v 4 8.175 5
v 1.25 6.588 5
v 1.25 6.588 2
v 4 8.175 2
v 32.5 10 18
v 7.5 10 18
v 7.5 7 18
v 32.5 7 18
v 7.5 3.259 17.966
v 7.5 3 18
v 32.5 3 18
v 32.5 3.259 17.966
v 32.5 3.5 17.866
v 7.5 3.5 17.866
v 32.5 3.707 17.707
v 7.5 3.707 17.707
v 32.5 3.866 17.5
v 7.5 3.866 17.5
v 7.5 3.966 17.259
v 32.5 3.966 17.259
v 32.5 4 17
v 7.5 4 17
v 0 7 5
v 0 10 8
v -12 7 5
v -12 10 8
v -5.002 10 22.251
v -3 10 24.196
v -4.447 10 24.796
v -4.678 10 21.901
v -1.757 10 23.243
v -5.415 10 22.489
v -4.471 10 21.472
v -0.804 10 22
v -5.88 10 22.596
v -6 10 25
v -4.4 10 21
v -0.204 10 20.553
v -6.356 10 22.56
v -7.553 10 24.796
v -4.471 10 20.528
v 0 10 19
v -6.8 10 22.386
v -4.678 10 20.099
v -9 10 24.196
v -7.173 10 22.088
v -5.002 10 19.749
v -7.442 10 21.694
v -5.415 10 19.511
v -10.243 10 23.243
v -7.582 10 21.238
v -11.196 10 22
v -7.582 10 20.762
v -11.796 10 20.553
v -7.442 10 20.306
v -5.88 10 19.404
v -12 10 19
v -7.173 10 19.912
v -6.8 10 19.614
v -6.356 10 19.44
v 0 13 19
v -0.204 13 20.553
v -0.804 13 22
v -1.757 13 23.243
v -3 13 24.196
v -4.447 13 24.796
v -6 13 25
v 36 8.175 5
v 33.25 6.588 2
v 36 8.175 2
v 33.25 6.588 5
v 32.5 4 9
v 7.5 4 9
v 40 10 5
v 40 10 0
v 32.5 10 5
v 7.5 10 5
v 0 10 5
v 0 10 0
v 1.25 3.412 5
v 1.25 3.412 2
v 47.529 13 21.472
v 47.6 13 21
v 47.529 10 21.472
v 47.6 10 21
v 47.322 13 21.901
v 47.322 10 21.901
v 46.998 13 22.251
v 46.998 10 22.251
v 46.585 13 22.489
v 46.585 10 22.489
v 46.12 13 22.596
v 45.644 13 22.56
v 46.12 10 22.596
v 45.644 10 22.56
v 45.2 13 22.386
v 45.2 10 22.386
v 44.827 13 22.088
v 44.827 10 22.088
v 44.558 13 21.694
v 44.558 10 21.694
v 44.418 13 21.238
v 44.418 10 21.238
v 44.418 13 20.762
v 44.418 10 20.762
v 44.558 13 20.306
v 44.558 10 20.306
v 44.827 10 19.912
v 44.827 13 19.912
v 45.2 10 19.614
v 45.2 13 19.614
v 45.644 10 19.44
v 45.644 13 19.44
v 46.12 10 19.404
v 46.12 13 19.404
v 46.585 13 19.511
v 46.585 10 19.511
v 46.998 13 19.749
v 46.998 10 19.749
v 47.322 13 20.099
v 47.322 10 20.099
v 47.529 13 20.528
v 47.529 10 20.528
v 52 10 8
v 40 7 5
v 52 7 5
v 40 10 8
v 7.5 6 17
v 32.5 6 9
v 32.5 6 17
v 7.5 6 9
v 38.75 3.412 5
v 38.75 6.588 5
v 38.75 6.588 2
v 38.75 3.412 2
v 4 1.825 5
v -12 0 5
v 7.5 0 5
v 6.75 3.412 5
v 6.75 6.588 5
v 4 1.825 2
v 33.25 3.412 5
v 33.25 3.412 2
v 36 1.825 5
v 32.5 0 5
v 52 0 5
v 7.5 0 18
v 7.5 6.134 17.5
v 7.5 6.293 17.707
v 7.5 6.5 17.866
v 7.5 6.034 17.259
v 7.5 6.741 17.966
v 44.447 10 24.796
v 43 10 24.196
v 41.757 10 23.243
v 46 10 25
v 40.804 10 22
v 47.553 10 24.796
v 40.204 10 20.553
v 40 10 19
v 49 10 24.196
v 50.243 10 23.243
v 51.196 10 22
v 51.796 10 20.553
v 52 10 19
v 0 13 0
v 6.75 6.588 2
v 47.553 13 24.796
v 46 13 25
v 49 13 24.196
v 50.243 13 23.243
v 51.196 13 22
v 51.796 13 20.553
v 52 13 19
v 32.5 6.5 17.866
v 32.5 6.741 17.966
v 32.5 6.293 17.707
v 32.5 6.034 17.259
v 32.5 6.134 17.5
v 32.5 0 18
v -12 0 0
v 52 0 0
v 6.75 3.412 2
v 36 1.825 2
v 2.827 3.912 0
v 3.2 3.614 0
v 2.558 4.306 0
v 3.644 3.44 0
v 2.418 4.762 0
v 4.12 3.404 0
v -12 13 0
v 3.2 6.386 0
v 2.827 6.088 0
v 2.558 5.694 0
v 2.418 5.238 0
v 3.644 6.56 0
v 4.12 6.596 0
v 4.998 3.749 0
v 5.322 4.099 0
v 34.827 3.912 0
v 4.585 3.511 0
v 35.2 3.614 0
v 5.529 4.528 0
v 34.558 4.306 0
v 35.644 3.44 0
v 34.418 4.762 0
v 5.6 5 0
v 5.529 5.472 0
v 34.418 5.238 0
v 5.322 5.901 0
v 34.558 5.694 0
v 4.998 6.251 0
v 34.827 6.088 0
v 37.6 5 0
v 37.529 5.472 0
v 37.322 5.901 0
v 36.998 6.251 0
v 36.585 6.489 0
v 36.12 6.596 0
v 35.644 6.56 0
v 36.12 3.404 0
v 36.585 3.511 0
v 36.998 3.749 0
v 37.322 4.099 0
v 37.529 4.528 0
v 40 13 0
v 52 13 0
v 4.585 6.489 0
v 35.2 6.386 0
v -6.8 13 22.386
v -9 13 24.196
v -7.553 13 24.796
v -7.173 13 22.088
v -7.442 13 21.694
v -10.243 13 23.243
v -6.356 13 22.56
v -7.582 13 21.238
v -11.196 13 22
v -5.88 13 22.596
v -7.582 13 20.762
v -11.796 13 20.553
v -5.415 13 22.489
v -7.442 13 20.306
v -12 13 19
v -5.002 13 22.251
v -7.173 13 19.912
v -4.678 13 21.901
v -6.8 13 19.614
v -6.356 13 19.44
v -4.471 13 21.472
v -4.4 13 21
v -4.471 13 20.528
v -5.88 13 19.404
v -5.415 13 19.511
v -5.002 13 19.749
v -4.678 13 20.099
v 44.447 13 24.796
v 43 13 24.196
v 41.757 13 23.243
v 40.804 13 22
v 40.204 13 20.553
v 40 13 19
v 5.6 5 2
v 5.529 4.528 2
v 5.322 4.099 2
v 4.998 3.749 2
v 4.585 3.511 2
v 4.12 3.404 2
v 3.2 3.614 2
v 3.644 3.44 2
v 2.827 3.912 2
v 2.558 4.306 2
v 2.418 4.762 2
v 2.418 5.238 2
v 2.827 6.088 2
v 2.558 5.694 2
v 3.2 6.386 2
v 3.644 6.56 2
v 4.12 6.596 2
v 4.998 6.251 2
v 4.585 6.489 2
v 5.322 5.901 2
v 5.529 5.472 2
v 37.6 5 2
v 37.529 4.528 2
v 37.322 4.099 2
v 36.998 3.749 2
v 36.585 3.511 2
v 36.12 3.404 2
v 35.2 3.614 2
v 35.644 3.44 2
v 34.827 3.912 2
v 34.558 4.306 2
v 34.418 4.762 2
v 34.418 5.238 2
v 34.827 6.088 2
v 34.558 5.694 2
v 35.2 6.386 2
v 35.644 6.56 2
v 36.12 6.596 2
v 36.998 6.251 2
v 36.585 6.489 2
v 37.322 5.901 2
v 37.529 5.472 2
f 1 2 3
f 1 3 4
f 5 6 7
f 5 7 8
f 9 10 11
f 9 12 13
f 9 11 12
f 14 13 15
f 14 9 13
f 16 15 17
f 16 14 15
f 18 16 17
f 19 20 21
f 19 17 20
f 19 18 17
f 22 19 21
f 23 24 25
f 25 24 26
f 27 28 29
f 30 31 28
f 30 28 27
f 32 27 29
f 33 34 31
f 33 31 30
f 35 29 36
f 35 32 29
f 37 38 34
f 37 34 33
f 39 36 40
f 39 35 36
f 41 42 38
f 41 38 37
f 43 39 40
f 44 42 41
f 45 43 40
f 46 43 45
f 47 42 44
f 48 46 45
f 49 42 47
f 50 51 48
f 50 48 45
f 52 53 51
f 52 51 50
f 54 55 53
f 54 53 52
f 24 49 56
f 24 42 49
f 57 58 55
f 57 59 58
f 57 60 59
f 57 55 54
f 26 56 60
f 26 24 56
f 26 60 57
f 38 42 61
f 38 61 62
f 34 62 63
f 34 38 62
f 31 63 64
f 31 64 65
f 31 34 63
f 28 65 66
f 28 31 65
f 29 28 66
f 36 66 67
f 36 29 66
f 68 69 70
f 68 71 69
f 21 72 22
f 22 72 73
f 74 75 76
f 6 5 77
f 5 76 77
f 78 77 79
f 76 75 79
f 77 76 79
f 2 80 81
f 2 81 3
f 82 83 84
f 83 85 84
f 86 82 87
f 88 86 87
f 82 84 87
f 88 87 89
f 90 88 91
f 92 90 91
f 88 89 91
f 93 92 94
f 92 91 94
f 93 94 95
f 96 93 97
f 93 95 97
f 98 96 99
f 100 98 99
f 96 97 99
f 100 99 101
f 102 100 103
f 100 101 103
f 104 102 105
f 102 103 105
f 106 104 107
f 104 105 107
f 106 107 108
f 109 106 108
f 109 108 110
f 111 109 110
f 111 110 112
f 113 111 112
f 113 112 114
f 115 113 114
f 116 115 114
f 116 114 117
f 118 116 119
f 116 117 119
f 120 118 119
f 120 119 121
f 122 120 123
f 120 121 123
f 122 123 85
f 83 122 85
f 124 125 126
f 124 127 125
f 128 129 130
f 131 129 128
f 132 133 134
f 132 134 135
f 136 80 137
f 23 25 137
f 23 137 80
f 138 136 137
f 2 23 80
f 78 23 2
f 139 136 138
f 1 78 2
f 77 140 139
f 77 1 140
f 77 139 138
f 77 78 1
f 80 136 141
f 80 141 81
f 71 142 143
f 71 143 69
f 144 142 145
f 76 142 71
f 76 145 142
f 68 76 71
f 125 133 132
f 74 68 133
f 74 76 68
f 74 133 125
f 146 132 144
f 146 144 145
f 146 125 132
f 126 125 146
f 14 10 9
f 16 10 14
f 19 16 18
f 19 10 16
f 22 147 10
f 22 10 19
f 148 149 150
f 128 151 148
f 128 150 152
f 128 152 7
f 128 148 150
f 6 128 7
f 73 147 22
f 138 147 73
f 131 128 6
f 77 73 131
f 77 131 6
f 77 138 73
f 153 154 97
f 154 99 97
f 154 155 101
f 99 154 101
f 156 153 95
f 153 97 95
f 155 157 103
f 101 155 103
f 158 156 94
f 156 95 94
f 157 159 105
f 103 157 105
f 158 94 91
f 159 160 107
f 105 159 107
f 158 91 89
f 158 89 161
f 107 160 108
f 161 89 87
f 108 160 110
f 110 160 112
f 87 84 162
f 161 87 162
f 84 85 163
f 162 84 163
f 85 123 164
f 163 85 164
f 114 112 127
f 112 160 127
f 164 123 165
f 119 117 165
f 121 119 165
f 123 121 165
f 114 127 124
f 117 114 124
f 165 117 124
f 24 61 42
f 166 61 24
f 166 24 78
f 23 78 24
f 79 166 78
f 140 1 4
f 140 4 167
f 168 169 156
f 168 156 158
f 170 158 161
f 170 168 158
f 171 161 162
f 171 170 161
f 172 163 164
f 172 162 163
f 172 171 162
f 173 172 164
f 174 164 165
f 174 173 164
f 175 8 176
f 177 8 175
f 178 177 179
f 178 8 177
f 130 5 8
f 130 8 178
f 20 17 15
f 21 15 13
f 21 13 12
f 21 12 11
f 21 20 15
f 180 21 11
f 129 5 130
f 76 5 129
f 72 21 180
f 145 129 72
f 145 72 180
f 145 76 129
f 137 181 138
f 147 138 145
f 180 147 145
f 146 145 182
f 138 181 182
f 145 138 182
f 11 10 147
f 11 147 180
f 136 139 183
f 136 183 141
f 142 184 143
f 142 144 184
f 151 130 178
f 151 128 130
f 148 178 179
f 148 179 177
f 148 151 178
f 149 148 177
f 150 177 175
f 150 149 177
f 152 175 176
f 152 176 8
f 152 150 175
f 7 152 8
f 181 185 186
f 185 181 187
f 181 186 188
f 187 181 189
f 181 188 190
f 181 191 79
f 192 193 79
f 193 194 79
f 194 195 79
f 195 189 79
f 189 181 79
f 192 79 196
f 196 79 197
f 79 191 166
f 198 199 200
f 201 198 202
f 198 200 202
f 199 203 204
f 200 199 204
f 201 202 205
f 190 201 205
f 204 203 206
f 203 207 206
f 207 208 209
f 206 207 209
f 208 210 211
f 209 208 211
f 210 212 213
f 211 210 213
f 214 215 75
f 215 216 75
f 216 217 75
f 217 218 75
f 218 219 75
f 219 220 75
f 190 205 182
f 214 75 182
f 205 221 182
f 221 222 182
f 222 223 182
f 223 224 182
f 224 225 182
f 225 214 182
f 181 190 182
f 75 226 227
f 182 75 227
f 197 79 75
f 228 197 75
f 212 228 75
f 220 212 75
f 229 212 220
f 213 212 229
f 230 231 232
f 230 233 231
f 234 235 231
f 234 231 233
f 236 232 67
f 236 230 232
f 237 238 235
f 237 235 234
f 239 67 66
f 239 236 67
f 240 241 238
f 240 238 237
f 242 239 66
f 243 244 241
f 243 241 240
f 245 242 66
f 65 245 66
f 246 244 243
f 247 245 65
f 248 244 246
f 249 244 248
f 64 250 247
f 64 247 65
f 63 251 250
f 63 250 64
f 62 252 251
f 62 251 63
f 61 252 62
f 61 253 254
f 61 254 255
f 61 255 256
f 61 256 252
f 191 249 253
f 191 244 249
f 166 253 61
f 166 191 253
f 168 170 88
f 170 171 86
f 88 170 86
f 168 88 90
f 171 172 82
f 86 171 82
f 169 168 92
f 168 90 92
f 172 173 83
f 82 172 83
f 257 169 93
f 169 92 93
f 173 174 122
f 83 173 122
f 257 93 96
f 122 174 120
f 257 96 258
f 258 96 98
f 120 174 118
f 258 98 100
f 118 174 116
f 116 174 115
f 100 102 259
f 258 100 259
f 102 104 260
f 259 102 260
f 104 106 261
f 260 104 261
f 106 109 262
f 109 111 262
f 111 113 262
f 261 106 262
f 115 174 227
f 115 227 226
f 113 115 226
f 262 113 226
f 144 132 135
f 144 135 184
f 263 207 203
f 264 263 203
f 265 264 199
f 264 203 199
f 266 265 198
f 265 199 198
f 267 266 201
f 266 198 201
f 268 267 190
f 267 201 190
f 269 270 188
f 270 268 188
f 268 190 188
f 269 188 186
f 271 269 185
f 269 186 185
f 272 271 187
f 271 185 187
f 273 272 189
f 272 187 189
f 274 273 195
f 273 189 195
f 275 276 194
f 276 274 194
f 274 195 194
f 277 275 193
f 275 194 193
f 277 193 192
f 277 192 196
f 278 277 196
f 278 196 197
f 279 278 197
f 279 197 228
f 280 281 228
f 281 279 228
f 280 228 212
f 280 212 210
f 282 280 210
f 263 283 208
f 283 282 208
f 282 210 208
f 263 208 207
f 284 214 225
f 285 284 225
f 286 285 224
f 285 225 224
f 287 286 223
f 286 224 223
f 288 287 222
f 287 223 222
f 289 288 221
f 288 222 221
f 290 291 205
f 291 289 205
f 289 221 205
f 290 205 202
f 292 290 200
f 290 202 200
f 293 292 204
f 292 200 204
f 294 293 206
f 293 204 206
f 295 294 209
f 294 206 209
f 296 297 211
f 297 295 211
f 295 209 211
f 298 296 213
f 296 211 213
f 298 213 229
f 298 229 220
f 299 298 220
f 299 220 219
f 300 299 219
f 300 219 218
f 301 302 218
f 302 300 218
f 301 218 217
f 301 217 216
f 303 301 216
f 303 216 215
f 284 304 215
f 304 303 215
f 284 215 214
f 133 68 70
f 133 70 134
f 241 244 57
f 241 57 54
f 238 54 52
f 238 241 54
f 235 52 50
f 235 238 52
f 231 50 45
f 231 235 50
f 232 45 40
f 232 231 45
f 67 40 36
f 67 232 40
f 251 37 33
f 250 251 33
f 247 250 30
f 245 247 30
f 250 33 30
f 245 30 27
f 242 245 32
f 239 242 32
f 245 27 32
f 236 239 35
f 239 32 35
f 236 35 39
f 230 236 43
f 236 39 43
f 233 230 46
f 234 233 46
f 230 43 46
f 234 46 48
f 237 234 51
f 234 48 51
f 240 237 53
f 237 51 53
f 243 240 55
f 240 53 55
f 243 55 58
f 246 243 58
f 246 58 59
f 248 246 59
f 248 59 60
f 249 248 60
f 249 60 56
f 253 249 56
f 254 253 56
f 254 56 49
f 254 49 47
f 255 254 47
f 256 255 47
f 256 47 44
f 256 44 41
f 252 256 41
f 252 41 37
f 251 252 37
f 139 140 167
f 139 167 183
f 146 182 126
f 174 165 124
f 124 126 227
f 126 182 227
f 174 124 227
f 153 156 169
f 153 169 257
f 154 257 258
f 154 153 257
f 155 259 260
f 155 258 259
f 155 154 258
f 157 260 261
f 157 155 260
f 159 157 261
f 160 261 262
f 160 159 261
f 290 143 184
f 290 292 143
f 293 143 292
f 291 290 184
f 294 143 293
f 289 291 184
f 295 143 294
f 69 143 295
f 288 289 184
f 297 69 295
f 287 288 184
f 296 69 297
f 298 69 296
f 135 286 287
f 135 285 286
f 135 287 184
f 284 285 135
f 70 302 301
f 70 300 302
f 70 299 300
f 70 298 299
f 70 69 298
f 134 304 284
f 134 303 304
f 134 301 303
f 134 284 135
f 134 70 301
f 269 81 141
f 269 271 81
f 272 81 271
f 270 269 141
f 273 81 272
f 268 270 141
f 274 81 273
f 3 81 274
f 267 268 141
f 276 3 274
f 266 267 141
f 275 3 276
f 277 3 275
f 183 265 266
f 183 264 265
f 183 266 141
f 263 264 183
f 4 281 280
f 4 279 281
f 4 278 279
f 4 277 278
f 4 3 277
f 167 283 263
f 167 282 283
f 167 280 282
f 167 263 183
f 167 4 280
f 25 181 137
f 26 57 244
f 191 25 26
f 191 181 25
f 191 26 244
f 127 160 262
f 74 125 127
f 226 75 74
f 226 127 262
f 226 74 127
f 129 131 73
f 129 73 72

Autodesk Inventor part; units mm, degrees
ref_plane "YZ Plane" through (0, 0, 0) normal (1, 0, 0) x (0, 1, 0)
ref_plane "XZ Plane" through (0, 0, 0) normal (0, 1, 0) x (-1, 0, 0)
ref_plane "XY Plane" through (0, 0, 0) normal (0, 0, 1) x (1, 0, 0)
sketch "Sketch1" plane through (0, 0, 0) normal (0, 0, 1) x (1, 0, 0)
  line L0 (0, 0) -> (40, 0)
  line L1 (40, 0) -> (40, 10)
  line L2 (40, 10) -> (0, 10)
  line L3 (0, 10) -> (0, 0)
  circle A0 centre (4, 5) radius 1.6
  circle A1 centre (36, 5) radius 1.6
  line L4 (0, 0) -> (-12, 0)
  line L5 (-12, 0) -> (-12, 13)
  line L6 (-12, 13) -> (0, 13)
  line L7 (0, 13) -> (0, 0)
  line L8 (40, 0) -> (52, 0)
  line L9 (52, 0) -> (52, 13)
  line L10 (52, 13) -> (40, 13)
  line L11 (40, 13) -> (40, 0)
  point P0 (0, 5)
  dimension "d0" = 40
  dimension "d1" = 10
  dimension "d22" = 3.2
  dimension "d23" = 3.2
  dimension "d24" = 4
  dimension "d25" = 4
  dimension "d43" = 12
  dimension "d44" = 12
  dimension "d45" = 13
  dimension "d46" = 13
extrude "Extrusion1" add sketch "Sketch1" along normal blind 5 contours L3 L2 L1 L0
extrude "Extrusion5" add sketch "Sketch1" along normal blind 5 contours L4 L5 L6 L7 L3 | L1 L11 L10 L9 L8
sketch "Sketch2" plane through (0, 0, 5) normal (0, 0, 1) x (1, 0, 0)
  line L0 (40, 10) -> (0, 10) projected
  line L1 (0, 0) -> (40, 0) projected
  line L2 (7.5, 10) -> (32.5, 10)
  line L3 (32.5, 10) -> (32.5, 6)
  line L4 (32.5, 6) -> (7.5, 6)
  line L5 (7.5, 6) -> (7.5, 10)
  line L6 (7.5, 0) -> (32.5, 0)
  line L7 (32.5, 0) -> (32.5, 4)
  line L8 (32.5, 4) -> (7.5, 4)
  line L9 (7.5, 4) -> (7.5, 0)
  line L10 (0, 13) -> (-12, 13) projected
  line L11 (52, 13) -> (40, 13) projected
  line L12 (-12, 13) -> (0, 13)
  line L13 (0, 13) -> (0, 10)
  line L14 (0, 10) -> (-12, 10)
  line L15 (-12, 10) -> (-12, 13)
  line L16 (52, 13) -> (40, 13)
  line L17 (40, 13) -> (40, 10)
  line L18 (40, 10) -> (52, 10)
  line L19 (52, 10) -> (52, 13)
  point P0 (20, 10)
  point P1 (20, 10)
  point P2 (20, 0)
  point P3 (20, 0)
  dimension "d14" = 25
  dimension "d15" = 25
  dimension "d31" = 2
  dimension "d32" = 4
  dimension "d33" = 4
extrude "Extrusion2" add sketch "Sketch2" along normal blind 13 contours L3 L4 L5 L0 | L9 L8 L7 L1
fillet "Fillet1" radius 1 2 edges at (20, 6, 18) (20, 4, 18)
sketch "Sketch3" plane through (0, 0, 5) normal (0, 0, 1) x (1, 0, 0)
  circle A0 centre (4, 5) radius 1.6 projected
  circle A1 centre (36, 5) radius 1.6 projected
  line L0 (6.75, 6.5877) -> (6.75, 3.4123)
  line L1 (6.75, 3.4123) -> (4, 1.8246)
  line L2 (4, 1.8246) -> (1.25, 3.4123)
  line L3 (1.25, 3.4123) -> (1.25, 6.5877)
  line L4 (1.25, 6.5877) -> (4, 8.1754)
  line L5 (4, 8.1754) -> (6.75, 6.5877)
  line L6 (33.25, 6.5877) -> (36, 8.1754)
  line L7 (36, 8.1754) -> (38.75, 6.5877)
  line L8 (38.75, 6.5877) -> (38.75, 3.4123)
  line L9 (38.75, 3.4123) -> (36, 1.8246)
  line L10 (36, 1.8246) -> (33.25, 3.4123)
  line L11 (33.25, 3.4123) -> (33.25, 6.5877)
  point P0 (0, 0)
  dimension "d39" = 5.5
  dimension "d40" = 5.5
extrude "Extrusion3" cut sketch "Sketch3" against normal blind 3
sketch "Sketch4" plane through (0, 0, 5) normal (0, 0, 1) x (1, 0, 0)
  line L0 (7.5, 6) -> (7.5, 10) projected
  line L1 (32.5, 4) -> (32.5, 0) projected
  line L2 (7.5, 6) -> (32.5, 6)
  line L3 (32.5, 6) -> (32.5, 4)
  line L4 (32.5, 4) -> (7.5, 4)
  line L5 (7.5, 4) -> (7.5, 6)
  point P0 (0, 0)
extrude "Extrusion4" add sketch "Sketch4" along normal blind 4
extrude "Extrusion7" add sketch "Sketch2" along normal blind 20 contours L13 L14 L15 L10 | L19 L18 L17 L11
sketch "Sketch5" plane through (-12, 10, 5) normal (0, -1, 0) x (1, 0, 0)
  circle A0 centre (6, 16) radius 1.6
  circle A1 centre (58, 16) radius 1.6
  line L0 (0, 20) -> (12, 20) projected
  line L1 (52, 20) -> (64, 20) projected
  point P0 (15, -5)
  point P1 (6, 20)
  point P2 (58, 20)
  dimension "d49" = 3.2
  dimension "d50" = 3.2
  dimension "d56" = 4
extrude "Extrusion6" cut sketch "Sketch5" against normal blind 5
chamfer "Chamfer2" distance 3 angle 45 2 edges at (-6, 10, 5) (46, 10, 5)
fillet "Fillet2" radius 6 4 edges at (0, 11.5, 25) (-12, 11.5, 25) (40, 11.5, 25) (52, 11.5, 25)
equation "\"d23\" = d22"
equation "\"d44\" = d43"
equation "\"d45\" = d46"
equation "\"d15\" = d14"
equation "\"d32\" = d33"
equation "\"d40\" = d39"
equation "\"d50\" = d49"
properties part number "GT2 grip v2"
